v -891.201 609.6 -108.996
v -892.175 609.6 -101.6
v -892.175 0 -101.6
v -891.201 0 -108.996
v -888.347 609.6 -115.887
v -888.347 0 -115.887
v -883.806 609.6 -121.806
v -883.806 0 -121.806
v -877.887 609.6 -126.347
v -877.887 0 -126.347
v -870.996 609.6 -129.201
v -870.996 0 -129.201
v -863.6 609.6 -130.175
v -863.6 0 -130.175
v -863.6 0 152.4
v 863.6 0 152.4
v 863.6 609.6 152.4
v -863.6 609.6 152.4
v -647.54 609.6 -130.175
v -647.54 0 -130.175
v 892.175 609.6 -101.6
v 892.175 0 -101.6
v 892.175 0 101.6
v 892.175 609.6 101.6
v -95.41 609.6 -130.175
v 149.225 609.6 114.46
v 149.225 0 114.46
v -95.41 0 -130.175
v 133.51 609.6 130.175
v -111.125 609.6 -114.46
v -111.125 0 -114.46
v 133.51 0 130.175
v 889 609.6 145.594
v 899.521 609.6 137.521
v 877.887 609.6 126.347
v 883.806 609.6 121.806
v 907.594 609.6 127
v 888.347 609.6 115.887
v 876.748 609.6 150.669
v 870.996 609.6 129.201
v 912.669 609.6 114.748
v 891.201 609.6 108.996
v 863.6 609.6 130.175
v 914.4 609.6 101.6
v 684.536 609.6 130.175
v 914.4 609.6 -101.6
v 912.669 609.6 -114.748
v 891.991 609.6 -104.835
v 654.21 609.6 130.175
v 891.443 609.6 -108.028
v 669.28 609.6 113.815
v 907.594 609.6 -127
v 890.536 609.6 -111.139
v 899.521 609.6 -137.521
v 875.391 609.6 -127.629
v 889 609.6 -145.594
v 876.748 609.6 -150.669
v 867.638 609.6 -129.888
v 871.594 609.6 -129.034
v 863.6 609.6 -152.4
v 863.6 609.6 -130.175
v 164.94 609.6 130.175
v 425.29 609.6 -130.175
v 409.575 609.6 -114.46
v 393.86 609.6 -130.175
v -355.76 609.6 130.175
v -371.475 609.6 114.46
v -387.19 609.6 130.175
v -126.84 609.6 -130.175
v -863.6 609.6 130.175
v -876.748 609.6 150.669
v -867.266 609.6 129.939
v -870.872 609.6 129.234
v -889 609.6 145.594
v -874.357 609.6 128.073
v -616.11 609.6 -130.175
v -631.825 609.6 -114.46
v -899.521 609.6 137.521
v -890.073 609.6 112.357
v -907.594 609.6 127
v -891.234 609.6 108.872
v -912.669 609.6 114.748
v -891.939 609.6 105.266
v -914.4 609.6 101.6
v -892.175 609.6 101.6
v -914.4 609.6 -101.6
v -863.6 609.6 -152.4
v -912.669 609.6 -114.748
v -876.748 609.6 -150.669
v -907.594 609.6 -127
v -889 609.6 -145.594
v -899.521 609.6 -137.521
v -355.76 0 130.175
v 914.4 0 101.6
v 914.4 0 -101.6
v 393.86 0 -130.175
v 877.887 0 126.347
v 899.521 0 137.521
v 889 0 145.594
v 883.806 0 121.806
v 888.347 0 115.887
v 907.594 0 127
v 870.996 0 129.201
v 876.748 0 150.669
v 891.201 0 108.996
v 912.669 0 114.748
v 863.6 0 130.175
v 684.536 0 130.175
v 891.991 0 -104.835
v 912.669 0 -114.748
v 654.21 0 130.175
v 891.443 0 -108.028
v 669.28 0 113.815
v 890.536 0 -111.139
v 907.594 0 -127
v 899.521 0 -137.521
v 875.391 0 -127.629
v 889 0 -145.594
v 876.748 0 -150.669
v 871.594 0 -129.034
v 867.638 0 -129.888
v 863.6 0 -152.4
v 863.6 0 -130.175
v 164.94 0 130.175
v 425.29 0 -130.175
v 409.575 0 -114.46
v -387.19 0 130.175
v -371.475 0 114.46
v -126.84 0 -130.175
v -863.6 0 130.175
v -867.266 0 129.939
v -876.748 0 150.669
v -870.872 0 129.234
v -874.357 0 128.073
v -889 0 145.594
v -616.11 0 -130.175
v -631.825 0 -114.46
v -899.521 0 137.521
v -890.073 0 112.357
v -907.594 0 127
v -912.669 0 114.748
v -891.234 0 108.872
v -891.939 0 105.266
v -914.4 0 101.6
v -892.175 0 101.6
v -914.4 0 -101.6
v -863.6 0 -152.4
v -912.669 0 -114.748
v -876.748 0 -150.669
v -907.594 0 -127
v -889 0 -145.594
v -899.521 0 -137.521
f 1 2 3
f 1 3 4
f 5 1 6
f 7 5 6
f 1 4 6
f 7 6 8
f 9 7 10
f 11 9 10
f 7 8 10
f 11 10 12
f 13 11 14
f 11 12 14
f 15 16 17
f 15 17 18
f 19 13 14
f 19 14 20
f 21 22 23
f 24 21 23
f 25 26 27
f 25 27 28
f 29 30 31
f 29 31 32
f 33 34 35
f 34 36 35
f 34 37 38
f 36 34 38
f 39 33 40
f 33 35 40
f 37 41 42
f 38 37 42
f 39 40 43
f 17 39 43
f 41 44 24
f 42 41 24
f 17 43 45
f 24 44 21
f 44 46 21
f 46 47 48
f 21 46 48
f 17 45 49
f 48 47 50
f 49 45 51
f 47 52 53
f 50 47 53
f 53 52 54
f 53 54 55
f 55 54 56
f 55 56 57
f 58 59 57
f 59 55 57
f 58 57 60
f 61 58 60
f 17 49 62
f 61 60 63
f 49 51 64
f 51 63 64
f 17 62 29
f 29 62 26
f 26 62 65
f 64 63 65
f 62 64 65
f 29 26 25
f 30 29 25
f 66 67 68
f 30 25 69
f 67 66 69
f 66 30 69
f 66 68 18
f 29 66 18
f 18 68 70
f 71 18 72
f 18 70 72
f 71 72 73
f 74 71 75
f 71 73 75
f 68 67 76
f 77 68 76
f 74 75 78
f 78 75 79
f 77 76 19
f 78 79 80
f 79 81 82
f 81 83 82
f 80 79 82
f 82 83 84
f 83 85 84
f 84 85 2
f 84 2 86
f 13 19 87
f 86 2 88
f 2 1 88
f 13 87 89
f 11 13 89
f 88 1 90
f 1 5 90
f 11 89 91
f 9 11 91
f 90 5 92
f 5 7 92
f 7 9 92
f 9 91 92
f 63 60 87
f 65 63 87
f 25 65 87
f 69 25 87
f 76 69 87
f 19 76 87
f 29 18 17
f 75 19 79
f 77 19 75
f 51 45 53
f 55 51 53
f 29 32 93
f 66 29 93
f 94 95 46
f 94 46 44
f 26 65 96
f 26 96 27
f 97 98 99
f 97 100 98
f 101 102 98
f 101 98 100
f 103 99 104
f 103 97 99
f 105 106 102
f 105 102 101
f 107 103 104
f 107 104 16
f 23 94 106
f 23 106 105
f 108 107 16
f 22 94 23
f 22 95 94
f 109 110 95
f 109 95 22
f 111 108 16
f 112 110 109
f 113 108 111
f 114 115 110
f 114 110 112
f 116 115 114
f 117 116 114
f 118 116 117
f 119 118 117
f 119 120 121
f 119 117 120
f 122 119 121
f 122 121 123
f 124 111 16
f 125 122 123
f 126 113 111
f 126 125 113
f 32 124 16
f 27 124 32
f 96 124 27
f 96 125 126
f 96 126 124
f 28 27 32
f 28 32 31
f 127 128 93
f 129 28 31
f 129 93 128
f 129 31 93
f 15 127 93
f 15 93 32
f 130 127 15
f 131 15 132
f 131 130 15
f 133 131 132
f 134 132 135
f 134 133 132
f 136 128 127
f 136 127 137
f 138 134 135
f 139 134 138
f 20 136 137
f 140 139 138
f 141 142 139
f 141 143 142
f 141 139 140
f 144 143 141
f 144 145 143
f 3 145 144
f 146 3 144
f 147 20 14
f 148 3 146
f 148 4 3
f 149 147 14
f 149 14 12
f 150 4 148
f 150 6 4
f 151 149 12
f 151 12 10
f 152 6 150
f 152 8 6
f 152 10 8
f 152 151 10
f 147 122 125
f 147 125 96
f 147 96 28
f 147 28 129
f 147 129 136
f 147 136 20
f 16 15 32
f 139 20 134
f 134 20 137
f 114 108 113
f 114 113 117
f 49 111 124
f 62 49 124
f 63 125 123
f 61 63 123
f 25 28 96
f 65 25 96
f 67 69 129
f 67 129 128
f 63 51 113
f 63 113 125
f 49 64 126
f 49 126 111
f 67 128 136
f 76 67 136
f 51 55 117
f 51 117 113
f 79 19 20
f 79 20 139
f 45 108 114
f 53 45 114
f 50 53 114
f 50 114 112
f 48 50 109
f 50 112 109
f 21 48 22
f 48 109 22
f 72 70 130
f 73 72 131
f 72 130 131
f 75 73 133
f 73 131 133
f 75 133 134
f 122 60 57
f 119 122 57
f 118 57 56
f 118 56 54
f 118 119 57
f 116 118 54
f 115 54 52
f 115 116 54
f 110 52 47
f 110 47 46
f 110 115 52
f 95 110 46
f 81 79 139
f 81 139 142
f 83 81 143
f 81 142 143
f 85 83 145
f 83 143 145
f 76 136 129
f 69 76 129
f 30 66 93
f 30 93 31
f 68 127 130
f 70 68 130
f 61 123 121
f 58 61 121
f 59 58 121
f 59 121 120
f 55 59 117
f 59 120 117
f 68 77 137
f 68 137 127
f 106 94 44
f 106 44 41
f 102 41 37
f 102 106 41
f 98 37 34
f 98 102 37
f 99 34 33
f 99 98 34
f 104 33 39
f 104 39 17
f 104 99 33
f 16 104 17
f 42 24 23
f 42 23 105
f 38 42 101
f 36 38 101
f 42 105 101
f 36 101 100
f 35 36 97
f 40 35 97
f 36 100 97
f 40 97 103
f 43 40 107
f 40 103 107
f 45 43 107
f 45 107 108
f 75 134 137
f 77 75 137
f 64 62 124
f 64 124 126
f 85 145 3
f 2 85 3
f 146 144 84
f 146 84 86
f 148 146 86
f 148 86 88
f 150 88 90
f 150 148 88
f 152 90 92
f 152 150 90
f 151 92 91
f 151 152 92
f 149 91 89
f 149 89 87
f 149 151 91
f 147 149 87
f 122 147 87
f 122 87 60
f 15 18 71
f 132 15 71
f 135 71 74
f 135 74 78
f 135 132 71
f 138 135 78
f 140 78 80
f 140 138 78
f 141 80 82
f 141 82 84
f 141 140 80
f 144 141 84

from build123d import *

# Parameters (mm, degrees)
EXTRUDE_THIN1_DEPTH = 609.6
EXTRUDE_THIN3_DEPTH = 609.6


with BuildPart() as part:
    # Sketch1 → Extrude-Thin1 (new body)
    with BuildSketch(Plane(origin=(0, 0, 0), x_dir=(1, 0, 0), z_dir=(0, 1, 0))):
        with BuildLine():
            Line((-863.6, 152.4), (863.6, 152.4))
            ThreePointArc((863.6, 152.4), (899.521024484, 137.521024484), (914.4, 101.6))
            Line((914.4, 101.6), (914.4, -101.6))
            ThreePointArc((914.4, -101.6), (899.521024484, -137.521024484), (863.6, -152.4))
            Line((863.6, -152.4), (-863.6, -152.4))
            ThreePointArc((-863.6, -152.4), (-899.521024484, -137.521024484), (-914.4, -101.6))
            Line((-914.4, -101.6), (-914.4, 101.6))
            ThreePointArc((-914.4, 101.6), (-899.521024484, 137.521024484), (-863.6, 152.4))
        make_face()
        with BuildLine():
            Line((-863.6, 130.175), (863.6, 130.175))
            ThreePointArc((863.6, 130.175), (883.805576272, 121.805576272), (892.175, 101.6))
            Line((892.175, 101.6), (892.175, -101.6))
            ThreePointArc((892.175, -101.6), (883.805576272, -121.805576272), (863.6, -130.175))
            Line((863.6, -130.175), (-863.6, -130.175))
            ThreePointArc((-863.6, -130.175), (-883.805576272, -121.805576272), (-892.175, -101.6))
            Line((-892.175, -101.6), (-892.175, 101.6))
            ThreePointArc((-892.175, 101.6), (-883.805576272, 121.805576272), (-863.6, 130.175))
        make_face(mode=Mode.SUBTRACT)
    extrude(amount=EXTRUDE_THIN1_DEPTH)

    # Sketch2 → Extrude-Thin3 (add)
    with BuildSketch(Plane(origin=(0, 609.6, 0), x_dir=(1, 0, 0), z_dir=(0, 1, 0))):
        Polygon((-884.317275894, -138.032724106), (-631.825, 114.459551788), (-371.475, -145.890448212), (-111.125, 114.459551788), (149.225, -145.890448212), (409.575, 114.459551788), (670.56979597, -146.535244182), (900.626773031, 122.960071803), (883.723226969, 137.389928197), (669.28020403, -113.814755818), (409.575, 145.890448212), (149.225, -114.459551788), (-111.125, 145.890448212), (-371.475, -114.459551788), (-631.825, 145.890448212), (-900.032724106, -122.317275894), align=None)
    extrude(amount=-EXTRUDE_THIN3_DEPTH)


solid = part.part
